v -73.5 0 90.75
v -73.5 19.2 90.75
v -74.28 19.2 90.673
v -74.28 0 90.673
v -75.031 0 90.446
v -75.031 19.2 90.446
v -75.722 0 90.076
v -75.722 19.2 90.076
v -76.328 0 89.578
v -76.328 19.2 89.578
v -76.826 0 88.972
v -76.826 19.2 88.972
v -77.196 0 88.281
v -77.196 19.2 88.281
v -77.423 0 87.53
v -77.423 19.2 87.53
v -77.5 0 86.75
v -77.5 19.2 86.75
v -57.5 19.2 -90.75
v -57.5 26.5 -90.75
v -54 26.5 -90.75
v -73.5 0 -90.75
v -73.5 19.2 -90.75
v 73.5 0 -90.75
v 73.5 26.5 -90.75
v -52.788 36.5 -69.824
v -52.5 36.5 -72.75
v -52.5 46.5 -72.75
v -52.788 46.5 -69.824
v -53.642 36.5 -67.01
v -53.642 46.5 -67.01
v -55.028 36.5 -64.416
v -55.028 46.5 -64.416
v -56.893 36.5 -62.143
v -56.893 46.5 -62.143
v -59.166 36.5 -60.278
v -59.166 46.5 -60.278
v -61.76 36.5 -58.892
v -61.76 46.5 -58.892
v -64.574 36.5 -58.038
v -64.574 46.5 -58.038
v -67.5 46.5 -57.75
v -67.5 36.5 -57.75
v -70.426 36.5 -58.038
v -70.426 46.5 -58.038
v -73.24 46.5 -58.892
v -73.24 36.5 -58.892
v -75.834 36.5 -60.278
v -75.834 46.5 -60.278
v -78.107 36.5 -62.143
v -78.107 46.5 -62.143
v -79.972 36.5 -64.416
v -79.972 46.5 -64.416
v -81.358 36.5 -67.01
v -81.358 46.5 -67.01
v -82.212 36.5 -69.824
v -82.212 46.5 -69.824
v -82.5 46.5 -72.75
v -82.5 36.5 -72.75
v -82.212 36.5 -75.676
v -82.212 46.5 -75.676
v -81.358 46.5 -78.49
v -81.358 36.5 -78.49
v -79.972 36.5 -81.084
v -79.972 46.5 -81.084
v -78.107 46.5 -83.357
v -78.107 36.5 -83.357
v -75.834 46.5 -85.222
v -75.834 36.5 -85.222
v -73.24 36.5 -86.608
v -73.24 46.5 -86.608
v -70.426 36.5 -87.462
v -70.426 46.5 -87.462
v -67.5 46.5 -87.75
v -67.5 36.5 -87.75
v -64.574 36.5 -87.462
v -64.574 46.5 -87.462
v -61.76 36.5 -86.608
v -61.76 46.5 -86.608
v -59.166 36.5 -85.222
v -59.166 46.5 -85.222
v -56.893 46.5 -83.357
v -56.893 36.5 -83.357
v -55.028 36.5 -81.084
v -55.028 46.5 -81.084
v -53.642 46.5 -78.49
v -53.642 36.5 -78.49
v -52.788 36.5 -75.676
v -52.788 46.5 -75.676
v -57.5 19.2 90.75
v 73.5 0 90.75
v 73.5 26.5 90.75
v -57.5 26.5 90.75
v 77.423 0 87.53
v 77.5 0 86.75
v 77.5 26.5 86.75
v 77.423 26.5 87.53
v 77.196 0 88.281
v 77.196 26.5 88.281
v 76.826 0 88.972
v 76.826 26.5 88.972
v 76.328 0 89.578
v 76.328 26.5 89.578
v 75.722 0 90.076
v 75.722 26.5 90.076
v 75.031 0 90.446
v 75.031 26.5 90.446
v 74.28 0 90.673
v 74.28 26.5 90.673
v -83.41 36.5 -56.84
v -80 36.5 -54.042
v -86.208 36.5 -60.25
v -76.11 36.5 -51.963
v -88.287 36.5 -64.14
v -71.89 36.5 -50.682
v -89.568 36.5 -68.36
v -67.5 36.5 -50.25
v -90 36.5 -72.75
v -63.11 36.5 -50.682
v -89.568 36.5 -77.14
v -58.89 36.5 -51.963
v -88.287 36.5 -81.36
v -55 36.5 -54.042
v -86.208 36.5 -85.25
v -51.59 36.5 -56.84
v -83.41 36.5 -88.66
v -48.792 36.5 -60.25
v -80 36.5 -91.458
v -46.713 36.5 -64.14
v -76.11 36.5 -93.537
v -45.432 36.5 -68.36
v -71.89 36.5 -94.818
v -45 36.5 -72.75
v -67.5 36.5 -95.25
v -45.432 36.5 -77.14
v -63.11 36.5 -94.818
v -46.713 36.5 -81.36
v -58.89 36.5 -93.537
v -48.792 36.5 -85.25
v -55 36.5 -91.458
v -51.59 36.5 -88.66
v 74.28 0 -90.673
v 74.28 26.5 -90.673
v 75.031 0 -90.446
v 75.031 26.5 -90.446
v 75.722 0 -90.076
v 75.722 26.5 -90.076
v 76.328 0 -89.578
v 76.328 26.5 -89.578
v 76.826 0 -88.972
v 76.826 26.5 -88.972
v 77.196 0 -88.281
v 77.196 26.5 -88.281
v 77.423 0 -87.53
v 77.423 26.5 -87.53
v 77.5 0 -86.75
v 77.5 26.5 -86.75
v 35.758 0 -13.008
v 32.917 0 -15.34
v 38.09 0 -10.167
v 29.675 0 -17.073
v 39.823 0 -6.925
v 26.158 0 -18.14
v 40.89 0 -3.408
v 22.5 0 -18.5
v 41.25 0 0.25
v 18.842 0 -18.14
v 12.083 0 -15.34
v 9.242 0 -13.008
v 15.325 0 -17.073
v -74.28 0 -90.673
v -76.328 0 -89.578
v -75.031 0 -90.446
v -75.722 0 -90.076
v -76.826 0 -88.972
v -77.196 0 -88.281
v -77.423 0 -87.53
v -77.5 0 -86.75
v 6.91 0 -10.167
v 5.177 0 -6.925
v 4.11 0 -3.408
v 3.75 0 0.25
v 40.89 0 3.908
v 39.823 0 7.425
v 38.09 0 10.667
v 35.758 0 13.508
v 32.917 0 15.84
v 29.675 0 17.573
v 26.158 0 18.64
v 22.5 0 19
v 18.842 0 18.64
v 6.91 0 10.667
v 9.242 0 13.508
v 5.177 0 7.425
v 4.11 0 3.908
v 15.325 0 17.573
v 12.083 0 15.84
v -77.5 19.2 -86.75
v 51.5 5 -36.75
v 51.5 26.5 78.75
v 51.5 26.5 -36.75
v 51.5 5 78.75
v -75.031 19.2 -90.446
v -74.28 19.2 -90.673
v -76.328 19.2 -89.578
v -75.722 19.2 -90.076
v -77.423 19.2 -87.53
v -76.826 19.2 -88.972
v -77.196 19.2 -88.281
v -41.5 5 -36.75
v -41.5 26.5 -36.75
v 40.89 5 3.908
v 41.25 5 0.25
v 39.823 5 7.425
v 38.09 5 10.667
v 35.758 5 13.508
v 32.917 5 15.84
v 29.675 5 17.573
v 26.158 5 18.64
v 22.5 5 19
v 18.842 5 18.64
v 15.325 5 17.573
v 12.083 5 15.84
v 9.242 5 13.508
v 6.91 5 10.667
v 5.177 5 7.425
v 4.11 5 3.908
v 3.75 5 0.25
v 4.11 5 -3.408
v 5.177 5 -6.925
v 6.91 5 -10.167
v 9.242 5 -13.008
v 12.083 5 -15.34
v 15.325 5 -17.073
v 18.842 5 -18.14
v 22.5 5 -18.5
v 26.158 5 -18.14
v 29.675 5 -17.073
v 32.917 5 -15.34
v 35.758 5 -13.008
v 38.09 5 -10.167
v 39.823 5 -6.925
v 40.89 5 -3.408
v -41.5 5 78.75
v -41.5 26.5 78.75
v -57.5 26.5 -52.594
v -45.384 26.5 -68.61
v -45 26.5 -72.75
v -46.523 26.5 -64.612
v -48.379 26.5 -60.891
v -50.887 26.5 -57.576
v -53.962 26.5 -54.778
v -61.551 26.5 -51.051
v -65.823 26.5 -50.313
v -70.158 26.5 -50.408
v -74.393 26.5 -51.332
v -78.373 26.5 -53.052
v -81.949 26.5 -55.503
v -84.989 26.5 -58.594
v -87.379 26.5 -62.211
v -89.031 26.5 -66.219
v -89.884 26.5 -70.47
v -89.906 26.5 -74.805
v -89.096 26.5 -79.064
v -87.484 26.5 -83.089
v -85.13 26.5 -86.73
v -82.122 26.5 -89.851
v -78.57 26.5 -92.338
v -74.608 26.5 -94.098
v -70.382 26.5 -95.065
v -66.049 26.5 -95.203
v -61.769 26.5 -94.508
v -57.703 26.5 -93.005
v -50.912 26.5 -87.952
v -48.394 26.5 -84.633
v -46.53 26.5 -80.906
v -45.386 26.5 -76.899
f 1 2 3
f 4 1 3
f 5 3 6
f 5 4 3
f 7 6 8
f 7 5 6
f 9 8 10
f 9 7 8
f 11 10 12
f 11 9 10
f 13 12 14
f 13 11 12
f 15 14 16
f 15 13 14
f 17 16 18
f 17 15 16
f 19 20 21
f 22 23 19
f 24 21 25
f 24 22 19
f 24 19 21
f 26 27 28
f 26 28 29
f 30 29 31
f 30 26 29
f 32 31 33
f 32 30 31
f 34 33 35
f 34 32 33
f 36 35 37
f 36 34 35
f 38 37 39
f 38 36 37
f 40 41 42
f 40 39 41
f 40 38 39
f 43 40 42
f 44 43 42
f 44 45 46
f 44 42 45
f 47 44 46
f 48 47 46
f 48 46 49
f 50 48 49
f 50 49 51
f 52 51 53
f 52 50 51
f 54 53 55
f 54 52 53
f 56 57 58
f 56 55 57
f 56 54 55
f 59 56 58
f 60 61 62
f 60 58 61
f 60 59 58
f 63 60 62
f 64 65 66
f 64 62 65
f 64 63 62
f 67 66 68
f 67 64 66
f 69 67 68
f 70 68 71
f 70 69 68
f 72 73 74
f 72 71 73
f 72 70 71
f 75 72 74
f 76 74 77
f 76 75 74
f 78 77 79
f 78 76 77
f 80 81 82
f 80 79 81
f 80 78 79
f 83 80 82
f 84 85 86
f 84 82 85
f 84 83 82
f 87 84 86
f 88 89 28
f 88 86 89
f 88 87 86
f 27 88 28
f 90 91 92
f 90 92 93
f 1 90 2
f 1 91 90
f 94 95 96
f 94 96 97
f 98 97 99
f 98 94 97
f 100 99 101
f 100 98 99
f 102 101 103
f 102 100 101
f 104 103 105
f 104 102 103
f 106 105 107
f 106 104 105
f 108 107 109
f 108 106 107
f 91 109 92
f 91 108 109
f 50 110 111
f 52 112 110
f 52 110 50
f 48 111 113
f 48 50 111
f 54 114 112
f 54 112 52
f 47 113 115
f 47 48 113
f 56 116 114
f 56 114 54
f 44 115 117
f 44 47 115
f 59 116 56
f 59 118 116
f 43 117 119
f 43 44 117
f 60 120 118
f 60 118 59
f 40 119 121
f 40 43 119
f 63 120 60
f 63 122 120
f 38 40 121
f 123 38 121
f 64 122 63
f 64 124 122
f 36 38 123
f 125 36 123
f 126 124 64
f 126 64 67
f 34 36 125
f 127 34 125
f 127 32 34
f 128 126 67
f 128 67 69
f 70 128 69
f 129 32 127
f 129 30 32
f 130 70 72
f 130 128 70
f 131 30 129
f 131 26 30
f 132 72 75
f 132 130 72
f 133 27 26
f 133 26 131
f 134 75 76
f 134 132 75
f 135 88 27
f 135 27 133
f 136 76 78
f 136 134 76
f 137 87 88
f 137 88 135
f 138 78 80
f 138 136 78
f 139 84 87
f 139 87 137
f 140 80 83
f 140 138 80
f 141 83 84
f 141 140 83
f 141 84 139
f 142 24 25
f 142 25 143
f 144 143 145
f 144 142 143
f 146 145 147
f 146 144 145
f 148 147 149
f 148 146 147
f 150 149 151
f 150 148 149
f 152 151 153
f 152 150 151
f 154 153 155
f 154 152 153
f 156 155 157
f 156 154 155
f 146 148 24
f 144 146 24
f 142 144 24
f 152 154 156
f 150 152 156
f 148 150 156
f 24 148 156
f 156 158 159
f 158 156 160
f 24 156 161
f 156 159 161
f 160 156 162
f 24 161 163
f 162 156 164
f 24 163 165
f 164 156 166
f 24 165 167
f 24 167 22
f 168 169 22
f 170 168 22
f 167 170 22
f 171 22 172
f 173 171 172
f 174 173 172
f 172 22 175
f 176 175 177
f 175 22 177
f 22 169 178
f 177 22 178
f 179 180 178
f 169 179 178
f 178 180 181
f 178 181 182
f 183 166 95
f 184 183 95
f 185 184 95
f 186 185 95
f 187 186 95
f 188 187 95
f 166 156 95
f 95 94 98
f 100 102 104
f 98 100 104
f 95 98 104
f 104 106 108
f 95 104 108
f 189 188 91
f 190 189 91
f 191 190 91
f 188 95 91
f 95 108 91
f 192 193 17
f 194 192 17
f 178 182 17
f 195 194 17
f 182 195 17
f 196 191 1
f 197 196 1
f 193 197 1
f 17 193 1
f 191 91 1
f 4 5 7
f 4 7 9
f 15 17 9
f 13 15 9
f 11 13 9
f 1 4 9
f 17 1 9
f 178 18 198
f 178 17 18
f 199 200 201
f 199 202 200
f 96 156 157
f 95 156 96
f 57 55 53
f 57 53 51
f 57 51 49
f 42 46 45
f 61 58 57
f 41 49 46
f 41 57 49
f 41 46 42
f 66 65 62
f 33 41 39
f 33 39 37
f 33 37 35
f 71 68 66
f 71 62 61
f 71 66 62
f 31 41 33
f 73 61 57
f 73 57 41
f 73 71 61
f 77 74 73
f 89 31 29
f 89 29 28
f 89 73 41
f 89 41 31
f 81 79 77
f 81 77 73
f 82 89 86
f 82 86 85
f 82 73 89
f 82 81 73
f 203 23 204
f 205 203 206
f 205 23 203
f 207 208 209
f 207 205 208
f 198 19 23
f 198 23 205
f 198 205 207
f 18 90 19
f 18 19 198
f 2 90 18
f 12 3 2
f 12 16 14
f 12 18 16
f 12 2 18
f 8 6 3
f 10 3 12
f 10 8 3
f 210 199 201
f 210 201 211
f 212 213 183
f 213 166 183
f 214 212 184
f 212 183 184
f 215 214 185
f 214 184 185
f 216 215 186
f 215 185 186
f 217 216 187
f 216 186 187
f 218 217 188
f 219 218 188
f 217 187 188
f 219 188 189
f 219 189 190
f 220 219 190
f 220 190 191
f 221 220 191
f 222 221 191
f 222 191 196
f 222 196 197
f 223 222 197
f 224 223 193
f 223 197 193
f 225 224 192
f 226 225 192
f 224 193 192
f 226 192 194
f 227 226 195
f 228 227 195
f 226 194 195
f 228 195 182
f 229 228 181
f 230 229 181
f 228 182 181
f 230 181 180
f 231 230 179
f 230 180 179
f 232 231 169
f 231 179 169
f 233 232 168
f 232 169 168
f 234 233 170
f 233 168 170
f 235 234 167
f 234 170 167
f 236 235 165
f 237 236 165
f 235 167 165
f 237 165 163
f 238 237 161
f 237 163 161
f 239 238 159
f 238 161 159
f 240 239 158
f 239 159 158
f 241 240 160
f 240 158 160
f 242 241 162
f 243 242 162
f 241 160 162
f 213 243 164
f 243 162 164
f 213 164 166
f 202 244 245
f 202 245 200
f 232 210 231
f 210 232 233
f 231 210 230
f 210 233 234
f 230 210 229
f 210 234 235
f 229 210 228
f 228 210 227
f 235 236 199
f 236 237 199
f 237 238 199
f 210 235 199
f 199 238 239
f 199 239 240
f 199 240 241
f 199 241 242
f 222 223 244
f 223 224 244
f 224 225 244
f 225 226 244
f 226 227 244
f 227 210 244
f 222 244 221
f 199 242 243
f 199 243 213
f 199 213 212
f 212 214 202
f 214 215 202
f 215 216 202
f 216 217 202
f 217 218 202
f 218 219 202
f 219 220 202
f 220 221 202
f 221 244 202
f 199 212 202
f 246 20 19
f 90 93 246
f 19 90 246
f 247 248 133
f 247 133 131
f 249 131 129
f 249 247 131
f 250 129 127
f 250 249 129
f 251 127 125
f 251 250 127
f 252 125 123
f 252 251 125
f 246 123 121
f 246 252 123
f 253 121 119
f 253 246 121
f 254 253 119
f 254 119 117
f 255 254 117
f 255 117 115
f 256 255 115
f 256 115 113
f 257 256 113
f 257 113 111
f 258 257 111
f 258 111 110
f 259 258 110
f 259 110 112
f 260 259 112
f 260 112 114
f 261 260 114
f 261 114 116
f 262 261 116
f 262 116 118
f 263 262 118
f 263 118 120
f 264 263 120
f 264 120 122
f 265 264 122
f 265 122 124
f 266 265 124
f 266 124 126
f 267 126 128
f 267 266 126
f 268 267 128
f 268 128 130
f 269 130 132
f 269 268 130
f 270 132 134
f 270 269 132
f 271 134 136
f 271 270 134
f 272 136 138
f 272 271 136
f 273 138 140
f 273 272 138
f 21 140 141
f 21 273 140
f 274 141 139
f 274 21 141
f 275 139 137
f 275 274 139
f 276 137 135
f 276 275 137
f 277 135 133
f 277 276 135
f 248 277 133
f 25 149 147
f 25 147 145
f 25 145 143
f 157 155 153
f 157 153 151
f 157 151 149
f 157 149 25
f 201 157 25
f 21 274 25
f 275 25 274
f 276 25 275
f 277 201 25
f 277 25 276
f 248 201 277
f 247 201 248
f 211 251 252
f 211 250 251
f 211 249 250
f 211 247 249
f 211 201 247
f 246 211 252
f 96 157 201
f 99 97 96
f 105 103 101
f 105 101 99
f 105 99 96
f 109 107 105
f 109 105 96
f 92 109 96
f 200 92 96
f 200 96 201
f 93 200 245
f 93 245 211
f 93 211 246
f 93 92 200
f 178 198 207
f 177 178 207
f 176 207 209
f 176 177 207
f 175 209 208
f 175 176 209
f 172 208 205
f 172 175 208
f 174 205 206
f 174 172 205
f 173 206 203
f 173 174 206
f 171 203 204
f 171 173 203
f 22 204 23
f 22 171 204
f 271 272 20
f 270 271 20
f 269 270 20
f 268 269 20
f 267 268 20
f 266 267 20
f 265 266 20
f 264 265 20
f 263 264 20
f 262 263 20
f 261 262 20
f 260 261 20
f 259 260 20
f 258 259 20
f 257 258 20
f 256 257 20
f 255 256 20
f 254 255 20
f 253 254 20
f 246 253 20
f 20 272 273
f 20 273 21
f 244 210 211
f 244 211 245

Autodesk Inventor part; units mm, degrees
ref_plane "YZ Plane" through (0, 0, 0) normal (1, 0, 0) x (0, 1, 0)
ref_plane "XZ Plane" through (0, 0, 0) normal (0, 1, 0) x (-1, 0, 0)
ref_plane "XY Plane" through (0, 0, 0) normal (0, 0, 1) x (1, 0, 0)
sketch "Skizze1" plane through (0, 0, 0) normal (0, 1, 0) x (-1, 0, 0)
  line L0 (73.5, -90.75) -> (-73.5, -90.75)
  line L1 (-77.5, -86.75) -> (-77.5, 86.75)
  line L2 (-73.5, 90.75) -> (73.5, 90.75)
  line L3 (77.5, 86.75) -> (77.5, -86.75)
  line L4 (77.5, -90.75) -> (-77.5, 90.75) construction
  line L5 (-77.5, -90.75) -> (77.5, 90.75) construction
  arc A0 (77.5, 86.75) -> (73.5, 90.75) centre (73.5, 86.75) ccw
  arc A1 (73.5, -90.75) -> (77.5, -86.75) centre (73.5, -86.75) ccw
  arc A2 (-77.5, -86.75) -> (-73.5, -90.75) centre (-73.5, -86.75) ccw
  arc A3 (-73.5, 90.75) -> (-77.5, 86.75) centre (-73.5, 86.75) ccw
  line L6 (41.5, 78.75) -> (-51.5, 78.75)
  line L7 (-51.5, 78.75) -> (-51.5, -36.75)
  line L8 (-51.5, -36.75) -> (41.5, -36.75)
  line L9 (41.5, -36.75) -> (41.5, 78.75)
  line L10 (41.5, 78.75) -> (-51.5, -36.75) construction
  line L11 (-51.5, 78.75) -> (41.5, -36.75) construction
  point P0 (0, 0)
  point P1 (-5, 21)
  dimension "d0" = 155
  dimension "d1" = 181.5
  dimension "d2" = 4
  dimension "d3" = 12
  dimension "d4" = 26
  dimension "d5" = 54
  dimension "d6" = 36
extrude "Extrusion1" add sketch "Skizze1" along normal blind 26.5
sketch "Skizze2" plane through (0, 0, 0) normal (0, -1, 0) x (1, 0, 0)
  line L0 (-73.5, 90.75) -> (73.5, 90.75) projected
  arc A0 (-73.5, 90.75) -> (-77.5, 86.75) centre (-73.5, 86.75) ccw projected
  line L1 (-77.5, -86.75) -> (-77.5, 86.75) projected
  arc A1 (-77.5, -86.75) -> (-73.5, -90.75) centre (-73.5, -86.75) ccw projected
  line L2 (73.5, -90.75) -> (-73.5, -90.75) projected
  arc A2 (73.5, -90.75) -> (77.5, -86.75) centre (73.5, -86.75) ccw projected
  line L3 (77.5, 86.75) -> (77.5, -86.75) projected
  arc A3 (77.5, 86.75) -> (73.5, 90.75) centre (73.5, 86.75) ccw projected
  line L4 (-41.5, 78.75) -> (-41.5, -36.75) projected
  line L5 (51.5, 78.75) -> (-41.5, 78.75) projected
  line L6 (51.5, -36.75) -> (51.5, 78.75) projected
  line L7 (-41.5, -36.75) -> (51.5, -36.75) projected
  circle A4 centre (22.5, 0.25) radius 18.75
  point P0 (0, 0)
  dimension "d9" = 37.5
  dimension "d11" = 90.5
  dimension "d14" = 55
extrude "Extrusion2" add sketch "Skizze2" against normal blind 5 contours L0 A3 L3 A2 L2 A1 L1 A0 | L5 L6 L7 L4
sketch "Skizze3" plane through (-73.5, 0, 90.75) normal (0, 0, 1) x (1, 0, 0)
  line L0 (-4, 0) -> (-4, 26.5) projected
  line L1 (0, 0) -> (0, 26.5) projected
  line L2 (-4, 0) -> (-4, 26.5) projected
  line L3 (-4, 26.5) -> (16, 26.5)
  line L4 (16, 26.5) -> (16, 19.2)
  line L5 (16, 19.2) -> (-4, 19.2)
  line L6 (-4, 19.2) -> (-4, 26.5)
  point P0 (73.5, 0)
  point P1 (-4, 19.2)
  dimension "d15" = 7.3
  dimension "d16" = 20
extrude "Extrusion3" cut sketch "Skizze3" against normal through all
sketch "Skizze4" plane through (0, 26.5, 0) normal (0, 1, 0) x (1, 0, 0)
  line L0 (-57.5, 90.75) -> (-57.5, -90.75) projected
  line L1 (-57.5, -90.75) -> (73.5, -90.75) projected
  arc A0 (73.5, -90.75) -> (77.5, -86.75) centre (73.5, -86.75) ccw projected
  line L2 (77.5, -86.75) -> (77.5, 86.75) projected
  arc A1 (77.5, 86.75) -> (73.5, 90.75) centre (73.5, 86.75) ccw projected
  line L3 (73.5, 90.75) -> (-57.5, 90.75) projected
  line L4 (-41.5, -78.75) -> (-41.5, 36.75) projected
  line L5 (-41.5, 36.75) -> (51.5, 36.75) projected
  line L6 (51.5, 36.75) -> (51.5, -78.75) projected
  line L7 (51.5, -78.75) -> (-41.5, -78.75) projected
  arc A2 (-77.5, -86.75) -> (-73.5, -90.75) centre (-73.5, -86.75) ccw projected
  line L8 (-57.5, -90.75) -> (-73.5, -90.75) projected
  line L9 (-57.5, -90.75) -> (-57.5, 90.75) projected
  line L10 (-73.5, 90.75) -> (-57.5, 90.75) projected
  arc A3 (-73.5, 90.75) -> (-77.5, 86.75) centre (-73.5, 86.75) ccw projected
  line L11 (-77.5, -86.75) -> (-77.5, 86.75) projected
  circle A4 centre (-67.5, 72.75) radius 22.5
  point P0 (0, 0)
  dimension "d19" = 45
  dimension "d20" = 10
  dimension "d21" = 18
extrude "Extrusion4" add sketch "Skizze4" along normal blind 10 contours L3 A4 L0 | L10 A3 L11 A4 L3 | L0 A4 L11 A3 L10
sketch "Skizze5" plane through (-67.5, 36.5, -72.75) normal (0, 1, 0) x (1, 0, 0)
  circle A0 centre (0, 0) radius 22.5 projected
  circle A1 centre (0, 0) radius 15
  point P0 (67.5, -72.75)
  dimension "d24" = 30
extrude "Extrusion5" add sketch "Skizze5" along normal blind 10 contours A1
equation "\"Biegeradius\" = Stärke"
equation "\"BreiteBiegungsfreistellung\" = Stärke"
equation "\"TiefeBiegungsfreistellung\" = 0.5 * Stärke"
equation "\"GrößeEckenfreistellung\" = 4 * Stärke"
equation "\"MinimalRest\" = 2 * Stärke"
equation "\"Übergangsradius\" = Biegeradius"
equation "\"JacobiRadiusGröße\" = Biegeradius"
equation "\"Abstandsgröße\" = Stärke"
equation "\"Stärke\" = 0.5"
properties part number "00_XYTable_china_75_55mm"
